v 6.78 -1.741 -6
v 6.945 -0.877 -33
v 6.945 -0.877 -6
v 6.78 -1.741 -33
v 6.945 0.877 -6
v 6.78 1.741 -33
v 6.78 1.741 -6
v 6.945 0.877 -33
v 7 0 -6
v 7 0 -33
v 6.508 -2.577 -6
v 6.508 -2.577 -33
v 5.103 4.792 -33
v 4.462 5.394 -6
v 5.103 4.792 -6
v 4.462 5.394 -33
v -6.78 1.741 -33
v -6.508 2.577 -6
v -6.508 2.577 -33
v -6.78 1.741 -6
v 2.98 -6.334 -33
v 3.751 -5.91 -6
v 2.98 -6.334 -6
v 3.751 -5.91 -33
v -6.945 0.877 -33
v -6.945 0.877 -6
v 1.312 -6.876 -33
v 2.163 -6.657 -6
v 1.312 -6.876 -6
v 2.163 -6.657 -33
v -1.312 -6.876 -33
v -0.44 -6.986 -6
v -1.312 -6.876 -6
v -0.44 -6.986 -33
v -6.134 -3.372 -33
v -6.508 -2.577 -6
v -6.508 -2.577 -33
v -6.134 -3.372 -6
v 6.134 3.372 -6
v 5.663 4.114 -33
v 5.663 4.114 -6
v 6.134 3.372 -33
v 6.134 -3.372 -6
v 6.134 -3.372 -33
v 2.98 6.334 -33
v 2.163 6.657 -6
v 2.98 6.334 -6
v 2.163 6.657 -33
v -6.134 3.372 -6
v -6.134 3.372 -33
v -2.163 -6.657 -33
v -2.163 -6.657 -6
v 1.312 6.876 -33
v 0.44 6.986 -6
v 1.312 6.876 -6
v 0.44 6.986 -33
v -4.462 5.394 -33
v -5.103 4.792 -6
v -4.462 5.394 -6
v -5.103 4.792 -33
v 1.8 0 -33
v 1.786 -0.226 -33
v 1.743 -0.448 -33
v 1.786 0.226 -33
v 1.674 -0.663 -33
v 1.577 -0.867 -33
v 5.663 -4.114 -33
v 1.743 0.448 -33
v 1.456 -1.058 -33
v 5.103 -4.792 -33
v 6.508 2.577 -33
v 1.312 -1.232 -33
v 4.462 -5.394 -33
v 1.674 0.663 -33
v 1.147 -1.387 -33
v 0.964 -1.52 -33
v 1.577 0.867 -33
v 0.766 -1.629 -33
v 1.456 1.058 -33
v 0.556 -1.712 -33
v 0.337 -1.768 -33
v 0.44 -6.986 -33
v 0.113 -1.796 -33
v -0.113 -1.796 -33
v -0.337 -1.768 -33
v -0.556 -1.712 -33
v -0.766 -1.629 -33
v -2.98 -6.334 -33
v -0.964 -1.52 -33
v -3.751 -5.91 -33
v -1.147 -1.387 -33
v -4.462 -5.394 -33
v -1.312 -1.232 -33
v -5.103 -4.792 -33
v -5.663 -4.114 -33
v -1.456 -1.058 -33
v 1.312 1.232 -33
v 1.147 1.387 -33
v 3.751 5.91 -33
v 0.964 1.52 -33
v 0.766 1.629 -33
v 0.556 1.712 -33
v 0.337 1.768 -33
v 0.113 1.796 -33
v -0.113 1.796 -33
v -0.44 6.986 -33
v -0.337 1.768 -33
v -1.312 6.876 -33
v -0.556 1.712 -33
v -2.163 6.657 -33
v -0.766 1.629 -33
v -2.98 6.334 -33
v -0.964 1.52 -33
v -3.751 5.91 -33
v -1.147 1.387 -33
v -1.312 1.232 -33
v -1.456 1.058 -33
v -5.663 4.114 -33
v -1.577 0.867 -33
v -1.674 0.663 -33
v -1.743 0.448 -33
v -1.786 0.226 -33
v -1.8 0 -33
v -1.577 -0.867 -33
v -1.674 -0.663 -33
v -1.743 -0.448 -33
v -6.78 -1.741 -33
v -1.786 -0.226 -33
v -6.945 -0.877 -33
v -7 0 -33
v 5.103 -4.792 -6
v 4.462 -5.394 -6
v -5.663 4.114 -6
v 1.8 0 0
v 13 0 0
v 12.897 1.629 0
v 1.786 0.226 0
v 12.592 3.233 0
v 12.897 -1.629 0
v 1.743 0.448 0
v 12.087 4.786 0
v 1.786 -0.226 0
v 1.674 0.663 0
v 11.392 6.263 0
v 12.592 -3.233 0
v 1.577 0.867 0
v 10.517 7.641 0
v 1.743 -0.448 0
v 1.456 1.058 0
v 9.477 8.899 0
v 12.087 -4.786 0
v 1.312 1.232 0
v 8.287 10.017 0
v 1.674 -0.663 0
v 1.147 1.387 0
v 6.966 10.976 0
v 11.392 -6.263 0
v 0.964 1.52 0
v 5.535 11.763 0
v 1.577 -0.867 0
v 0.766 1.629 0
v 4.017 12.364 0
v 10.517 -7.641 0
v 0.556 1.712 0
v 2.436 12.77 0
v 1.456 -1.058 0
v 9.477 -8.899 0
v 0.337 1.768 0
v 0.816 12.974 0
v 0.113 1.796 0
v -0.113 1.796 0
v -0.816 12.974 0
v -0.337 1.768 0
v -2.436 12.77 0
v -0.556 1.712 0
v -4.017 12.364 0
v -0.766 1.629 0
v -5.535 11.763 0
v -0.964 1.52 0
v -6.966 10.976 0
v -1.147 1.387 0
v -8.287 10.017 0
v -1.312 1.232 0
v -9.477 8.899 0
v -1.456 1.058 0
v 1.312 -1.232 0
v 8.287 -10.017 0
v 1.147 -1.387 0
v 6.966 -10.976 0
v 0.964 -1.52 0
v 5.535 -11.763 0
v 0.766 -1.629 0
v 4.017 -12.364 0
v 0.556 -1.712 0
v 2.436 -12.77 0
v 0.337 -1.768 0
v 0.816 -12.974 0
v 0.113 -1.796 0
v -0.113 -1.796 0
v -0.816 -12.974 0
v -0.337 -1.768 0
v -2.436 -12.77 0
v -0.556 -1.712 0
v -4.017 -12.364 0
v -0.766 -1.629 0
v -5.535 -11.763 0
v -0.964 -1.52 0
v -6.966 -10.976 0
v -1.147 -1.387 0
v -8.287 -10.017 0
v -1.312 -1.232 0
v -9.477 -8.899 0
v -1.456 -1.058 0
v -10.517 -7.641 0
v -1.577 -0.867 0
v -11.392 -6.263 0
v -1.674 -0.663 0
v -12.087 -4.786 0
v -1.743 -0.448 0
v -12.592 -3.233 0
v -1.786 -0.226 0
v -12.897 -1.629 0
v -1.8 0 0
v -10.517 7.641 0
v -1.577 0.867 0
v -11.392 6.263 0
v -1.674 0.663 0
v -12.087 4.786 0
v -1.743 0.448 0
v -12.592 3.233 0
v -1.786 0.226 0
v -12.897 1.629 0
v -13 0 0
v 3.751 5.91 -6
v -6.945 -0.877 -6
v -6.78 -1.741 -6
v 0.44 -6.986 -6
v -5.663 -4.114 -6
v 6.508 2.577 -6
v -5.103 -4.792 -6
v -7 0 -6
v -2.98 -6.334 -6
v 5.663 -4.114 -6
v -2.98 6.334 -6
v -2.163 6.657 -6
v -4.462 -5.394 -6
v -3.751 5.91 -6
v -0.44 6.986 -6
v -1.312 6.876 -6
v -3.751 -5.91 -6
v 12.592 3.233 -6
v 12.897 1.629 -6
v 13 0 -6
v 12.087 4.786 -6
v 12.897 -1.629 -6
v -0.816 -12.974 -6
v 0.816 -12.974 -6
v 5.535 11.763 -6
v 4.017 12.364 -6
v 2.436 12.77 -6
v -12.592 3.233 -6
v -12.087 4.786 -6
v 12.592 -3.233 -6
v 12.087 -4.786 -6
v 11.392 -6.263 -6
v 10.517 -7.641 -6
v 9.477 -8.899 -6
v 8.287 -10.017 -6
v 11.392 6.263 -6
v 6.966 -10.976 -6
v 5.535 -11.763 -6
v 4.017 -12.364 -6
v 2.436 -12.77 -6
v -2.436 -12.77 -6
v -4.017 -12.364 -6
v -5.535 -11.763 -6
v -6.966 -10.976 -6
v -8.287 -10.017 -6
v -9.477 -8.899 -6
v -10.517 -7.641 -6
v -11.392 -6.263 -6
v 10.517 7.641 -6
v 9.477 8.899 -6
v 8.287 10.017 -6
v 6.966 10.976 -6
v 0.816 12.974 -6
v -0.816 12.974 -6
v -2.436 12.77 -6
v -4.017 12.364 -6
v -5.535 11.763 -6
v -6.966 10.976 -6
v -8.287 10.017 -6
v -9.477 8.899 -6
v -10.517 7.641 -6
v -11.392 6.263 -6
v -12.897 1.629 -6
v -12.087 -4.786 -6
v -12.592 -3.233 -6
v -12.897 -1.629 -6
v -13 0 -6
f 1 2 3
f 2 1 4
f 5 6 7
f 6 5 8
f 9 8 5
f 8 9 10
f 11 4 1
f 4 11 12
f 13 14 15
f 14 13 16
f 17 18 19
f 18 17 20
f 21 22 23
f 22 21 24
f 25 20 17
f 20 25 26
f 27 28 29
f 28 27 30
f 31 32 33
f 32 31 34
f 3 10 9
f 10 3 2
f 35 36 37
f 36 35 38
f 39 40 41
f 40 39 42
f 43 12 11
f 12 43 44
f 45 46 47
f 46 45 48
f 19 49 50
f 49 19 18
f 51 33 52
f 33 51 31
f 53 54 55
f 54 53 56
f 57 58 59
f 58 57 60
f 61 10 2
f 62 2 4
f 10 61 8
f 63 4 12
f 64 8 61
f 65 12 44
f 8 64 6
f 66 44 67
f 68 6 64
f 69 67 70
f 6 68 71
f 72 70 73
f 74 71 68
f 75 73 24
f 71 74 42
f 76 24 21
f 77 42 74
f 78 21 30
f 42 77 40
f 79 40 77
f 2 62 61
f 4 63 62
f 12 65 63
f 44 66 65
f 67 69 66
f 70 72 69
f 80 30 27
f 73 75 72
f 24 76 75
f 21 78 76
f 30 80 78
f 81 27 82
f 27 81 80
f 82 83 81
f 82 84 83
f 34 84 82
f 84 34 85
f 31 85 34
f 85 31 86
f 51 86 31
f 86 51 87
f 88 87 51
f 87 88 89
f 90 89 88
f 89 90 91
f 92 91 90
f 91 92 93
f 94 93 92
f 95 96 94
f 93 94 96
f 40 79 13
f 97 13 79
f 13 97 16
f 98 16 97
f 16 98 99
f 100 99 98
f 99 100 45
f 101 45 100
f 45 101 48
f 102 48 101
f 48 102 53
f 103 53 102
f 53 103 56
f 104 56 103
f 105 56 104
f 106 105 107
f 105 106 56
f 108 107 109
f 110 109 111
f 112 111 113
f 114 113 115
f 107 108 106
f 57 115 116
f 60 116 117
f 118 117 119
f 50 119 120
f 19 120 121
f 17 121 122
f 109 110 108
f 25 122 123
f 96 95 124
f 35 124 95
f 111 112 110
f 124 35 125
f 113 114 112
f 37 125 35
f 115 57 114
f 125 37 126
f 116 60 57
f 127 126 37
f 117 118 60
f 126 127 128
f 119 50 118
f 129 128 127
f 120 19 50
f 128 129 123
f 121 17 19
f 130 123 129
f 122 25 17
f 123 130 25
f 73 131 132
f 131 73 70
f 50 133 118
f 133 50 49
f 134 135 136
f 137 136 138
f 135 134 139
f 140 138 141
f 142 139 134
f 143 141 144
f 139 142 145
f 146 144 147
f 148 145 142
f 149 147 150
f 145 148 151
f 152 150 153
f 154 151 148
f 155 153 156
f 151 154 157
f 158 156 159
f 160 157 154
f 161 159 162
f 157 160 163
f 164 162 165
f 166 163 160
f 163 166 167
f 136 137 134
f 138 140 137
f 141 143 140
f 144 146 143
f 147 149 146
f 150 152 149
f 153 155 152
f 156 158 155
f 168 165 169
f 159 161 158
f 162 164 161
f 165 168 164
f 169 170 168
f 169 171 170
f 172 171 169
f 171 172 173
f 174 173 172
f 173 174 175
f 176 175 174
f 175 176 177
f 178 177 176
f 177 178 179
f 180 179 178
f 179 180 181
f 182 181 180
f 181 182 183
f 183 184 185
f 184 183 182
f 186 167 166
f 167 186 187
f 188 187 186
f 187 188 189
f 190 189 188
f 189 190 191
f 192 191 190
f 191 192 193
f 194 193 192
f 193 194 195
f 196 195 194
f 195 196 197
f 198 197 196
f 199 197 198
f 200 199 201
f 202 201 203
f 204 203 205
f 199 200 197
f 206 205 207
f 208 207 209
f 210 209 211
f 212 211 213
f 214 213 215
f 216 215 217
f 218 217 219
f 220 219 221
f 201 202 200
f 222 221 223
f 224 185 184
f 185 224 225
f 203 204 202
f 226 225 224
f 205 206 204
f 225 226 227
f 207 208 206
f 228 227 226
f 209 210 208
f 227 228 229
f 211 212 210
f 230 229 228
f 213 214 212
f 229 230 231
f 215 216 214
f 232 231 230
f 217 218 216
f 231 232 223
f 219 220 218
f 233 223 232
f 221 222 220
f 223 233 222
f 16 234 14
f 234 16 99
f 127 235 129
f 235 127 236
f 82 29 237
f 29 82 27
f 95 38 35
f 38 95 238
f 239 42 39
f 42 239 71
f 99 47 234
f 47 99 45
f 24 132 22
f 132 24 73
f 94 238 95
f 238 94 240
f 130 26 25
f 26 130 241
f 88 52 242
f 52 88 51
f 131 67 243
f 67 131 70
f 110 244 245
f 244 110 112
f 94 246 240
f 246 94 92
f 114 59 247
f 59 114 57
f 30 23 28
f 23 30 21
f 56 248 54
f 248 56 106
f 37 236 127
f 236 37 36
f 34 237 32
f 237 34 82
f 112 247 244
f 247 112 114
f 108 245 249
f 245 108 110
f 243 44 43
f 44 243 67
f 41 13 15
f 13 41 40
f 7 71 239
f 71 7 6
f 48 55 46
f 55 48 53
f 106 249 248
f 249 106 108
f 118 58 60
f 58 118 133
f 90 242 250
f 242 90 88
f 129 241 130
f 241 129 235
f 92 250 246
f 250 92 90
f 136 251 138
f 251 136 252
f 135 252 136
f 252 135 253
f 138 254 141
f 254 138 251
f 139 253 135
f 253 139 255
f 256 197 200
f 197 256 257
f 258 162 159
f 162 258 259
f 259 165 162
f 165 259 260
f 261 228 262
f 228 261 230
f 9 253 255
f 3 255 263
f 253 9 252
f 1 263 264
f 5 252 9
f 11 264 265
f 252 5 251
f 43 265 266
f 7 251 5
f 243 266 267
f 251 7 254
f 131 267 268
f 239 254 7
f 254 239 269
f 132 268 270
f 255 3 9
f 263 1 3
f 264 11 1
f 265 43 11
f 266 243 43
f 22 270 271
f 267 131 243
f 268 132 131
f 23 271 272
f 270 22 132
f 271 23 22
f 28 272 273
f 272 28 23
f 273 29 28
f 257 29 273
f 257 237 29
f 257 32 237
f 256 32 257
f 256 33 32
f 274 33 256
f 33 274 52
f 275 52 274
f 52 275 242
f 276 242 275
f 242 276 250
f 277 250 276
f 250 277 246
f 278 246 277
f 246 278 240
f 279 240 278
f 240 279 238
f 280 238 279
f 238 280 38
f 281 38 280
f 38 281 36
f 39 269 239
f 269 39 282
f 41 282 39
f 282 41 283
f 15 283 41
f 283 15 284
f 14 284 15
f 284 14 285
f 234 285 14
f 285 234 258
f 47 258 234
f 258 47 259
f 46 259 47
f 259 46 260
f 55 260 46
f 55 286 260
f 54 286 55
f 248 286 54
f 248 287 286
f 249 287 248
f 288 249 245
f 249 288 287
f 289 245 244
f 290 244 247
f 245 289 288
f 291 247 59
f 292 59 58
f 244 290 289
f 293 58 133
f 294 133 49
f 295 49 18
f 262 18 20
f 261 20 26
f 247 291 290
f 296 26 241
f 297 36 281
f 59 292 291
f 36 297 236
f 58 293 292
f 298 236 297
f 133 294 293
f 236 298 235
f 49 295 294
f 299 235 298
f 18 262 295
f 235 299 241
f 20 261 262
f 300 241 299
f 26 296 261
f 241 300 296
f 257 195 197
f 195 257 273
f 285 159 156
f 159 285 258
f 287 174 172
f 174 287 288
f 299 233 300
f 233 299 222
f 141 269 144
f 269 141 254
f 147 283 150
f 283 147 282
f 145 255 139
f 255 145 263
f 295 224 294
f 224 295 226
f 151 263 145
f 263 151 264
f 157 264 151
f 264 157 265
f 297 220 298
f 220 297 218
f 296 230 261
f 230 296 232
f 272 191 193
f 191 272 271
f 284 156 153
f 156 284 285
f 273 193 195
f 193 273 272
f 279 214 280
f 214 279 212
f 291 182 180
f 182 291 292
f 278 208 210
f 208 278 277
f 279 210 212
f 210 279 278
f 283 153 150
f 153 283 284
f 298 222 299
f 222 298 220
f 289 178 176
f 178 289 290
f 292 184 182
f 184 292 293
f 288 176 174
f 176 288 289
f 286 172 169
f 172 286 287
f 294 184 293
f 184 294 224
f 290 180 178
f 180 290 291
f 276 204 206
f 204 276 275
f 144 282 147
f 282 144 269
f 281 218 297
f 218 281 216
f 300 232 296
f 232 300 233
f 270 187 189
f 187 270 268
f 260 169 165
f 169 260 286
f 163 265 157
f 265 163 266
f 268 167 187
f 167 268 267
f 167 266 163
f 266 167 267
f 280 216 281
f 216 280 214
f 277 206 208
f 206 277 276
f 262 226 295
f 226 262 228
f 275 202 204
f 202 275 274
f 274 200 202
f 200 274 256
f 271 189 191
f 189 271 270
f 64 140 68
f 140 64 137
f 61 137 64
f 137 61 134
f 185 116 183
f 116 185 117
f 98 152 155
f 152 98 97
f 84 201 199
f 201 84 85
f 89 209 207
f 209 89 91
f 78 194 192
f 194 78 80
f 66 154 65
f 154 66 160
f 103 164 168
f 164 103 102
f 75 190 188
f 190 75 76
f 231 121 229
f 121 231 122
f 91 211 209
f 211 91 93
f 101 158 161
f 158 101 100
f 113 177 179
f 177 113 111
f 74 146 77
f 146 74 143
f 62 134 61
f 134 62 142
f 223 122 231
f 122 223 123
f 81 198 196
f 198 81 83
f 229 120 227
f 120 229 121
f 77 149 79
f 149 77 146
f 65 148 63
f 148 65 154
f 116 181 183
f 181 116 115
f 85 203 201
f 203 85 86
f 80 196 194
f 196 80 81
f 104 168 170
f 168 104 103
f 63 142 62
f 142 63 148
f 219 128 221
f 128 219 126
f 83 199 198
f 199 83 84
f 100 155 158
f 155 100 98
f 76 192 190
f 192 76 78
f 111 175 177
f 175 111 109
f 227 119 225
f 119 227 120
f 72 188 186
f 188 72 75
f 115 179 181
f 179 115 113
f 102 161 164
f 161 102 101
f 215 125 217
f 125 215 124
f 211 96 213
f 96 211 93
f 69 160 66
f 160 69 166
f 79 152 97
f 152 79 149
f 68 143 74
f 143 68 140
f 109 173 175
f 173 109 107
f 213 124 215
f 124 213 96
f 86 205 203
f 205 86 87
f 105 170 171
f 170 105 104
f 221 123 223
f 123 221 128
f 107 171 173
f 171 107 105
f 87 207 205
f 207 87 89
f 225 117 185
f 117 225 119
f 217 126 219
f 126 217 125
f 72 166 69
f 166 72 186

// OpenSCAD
$fn = 50;


difference() {
	union() {
		translate(v = [0, 0, -33.0000000000]) {
			cylinder(h = 33, r = 7.0000000000);
		}
		translate(v = [0, 0, -6.0000000000]) {
			cylinder(h = 6, r = 13.0000000000);
		}
	}
	union() {
		#translate(v = [0, 0, -33]) {
			cylinder(h = 33, r = 1.8000000000);
		}
	}
}
